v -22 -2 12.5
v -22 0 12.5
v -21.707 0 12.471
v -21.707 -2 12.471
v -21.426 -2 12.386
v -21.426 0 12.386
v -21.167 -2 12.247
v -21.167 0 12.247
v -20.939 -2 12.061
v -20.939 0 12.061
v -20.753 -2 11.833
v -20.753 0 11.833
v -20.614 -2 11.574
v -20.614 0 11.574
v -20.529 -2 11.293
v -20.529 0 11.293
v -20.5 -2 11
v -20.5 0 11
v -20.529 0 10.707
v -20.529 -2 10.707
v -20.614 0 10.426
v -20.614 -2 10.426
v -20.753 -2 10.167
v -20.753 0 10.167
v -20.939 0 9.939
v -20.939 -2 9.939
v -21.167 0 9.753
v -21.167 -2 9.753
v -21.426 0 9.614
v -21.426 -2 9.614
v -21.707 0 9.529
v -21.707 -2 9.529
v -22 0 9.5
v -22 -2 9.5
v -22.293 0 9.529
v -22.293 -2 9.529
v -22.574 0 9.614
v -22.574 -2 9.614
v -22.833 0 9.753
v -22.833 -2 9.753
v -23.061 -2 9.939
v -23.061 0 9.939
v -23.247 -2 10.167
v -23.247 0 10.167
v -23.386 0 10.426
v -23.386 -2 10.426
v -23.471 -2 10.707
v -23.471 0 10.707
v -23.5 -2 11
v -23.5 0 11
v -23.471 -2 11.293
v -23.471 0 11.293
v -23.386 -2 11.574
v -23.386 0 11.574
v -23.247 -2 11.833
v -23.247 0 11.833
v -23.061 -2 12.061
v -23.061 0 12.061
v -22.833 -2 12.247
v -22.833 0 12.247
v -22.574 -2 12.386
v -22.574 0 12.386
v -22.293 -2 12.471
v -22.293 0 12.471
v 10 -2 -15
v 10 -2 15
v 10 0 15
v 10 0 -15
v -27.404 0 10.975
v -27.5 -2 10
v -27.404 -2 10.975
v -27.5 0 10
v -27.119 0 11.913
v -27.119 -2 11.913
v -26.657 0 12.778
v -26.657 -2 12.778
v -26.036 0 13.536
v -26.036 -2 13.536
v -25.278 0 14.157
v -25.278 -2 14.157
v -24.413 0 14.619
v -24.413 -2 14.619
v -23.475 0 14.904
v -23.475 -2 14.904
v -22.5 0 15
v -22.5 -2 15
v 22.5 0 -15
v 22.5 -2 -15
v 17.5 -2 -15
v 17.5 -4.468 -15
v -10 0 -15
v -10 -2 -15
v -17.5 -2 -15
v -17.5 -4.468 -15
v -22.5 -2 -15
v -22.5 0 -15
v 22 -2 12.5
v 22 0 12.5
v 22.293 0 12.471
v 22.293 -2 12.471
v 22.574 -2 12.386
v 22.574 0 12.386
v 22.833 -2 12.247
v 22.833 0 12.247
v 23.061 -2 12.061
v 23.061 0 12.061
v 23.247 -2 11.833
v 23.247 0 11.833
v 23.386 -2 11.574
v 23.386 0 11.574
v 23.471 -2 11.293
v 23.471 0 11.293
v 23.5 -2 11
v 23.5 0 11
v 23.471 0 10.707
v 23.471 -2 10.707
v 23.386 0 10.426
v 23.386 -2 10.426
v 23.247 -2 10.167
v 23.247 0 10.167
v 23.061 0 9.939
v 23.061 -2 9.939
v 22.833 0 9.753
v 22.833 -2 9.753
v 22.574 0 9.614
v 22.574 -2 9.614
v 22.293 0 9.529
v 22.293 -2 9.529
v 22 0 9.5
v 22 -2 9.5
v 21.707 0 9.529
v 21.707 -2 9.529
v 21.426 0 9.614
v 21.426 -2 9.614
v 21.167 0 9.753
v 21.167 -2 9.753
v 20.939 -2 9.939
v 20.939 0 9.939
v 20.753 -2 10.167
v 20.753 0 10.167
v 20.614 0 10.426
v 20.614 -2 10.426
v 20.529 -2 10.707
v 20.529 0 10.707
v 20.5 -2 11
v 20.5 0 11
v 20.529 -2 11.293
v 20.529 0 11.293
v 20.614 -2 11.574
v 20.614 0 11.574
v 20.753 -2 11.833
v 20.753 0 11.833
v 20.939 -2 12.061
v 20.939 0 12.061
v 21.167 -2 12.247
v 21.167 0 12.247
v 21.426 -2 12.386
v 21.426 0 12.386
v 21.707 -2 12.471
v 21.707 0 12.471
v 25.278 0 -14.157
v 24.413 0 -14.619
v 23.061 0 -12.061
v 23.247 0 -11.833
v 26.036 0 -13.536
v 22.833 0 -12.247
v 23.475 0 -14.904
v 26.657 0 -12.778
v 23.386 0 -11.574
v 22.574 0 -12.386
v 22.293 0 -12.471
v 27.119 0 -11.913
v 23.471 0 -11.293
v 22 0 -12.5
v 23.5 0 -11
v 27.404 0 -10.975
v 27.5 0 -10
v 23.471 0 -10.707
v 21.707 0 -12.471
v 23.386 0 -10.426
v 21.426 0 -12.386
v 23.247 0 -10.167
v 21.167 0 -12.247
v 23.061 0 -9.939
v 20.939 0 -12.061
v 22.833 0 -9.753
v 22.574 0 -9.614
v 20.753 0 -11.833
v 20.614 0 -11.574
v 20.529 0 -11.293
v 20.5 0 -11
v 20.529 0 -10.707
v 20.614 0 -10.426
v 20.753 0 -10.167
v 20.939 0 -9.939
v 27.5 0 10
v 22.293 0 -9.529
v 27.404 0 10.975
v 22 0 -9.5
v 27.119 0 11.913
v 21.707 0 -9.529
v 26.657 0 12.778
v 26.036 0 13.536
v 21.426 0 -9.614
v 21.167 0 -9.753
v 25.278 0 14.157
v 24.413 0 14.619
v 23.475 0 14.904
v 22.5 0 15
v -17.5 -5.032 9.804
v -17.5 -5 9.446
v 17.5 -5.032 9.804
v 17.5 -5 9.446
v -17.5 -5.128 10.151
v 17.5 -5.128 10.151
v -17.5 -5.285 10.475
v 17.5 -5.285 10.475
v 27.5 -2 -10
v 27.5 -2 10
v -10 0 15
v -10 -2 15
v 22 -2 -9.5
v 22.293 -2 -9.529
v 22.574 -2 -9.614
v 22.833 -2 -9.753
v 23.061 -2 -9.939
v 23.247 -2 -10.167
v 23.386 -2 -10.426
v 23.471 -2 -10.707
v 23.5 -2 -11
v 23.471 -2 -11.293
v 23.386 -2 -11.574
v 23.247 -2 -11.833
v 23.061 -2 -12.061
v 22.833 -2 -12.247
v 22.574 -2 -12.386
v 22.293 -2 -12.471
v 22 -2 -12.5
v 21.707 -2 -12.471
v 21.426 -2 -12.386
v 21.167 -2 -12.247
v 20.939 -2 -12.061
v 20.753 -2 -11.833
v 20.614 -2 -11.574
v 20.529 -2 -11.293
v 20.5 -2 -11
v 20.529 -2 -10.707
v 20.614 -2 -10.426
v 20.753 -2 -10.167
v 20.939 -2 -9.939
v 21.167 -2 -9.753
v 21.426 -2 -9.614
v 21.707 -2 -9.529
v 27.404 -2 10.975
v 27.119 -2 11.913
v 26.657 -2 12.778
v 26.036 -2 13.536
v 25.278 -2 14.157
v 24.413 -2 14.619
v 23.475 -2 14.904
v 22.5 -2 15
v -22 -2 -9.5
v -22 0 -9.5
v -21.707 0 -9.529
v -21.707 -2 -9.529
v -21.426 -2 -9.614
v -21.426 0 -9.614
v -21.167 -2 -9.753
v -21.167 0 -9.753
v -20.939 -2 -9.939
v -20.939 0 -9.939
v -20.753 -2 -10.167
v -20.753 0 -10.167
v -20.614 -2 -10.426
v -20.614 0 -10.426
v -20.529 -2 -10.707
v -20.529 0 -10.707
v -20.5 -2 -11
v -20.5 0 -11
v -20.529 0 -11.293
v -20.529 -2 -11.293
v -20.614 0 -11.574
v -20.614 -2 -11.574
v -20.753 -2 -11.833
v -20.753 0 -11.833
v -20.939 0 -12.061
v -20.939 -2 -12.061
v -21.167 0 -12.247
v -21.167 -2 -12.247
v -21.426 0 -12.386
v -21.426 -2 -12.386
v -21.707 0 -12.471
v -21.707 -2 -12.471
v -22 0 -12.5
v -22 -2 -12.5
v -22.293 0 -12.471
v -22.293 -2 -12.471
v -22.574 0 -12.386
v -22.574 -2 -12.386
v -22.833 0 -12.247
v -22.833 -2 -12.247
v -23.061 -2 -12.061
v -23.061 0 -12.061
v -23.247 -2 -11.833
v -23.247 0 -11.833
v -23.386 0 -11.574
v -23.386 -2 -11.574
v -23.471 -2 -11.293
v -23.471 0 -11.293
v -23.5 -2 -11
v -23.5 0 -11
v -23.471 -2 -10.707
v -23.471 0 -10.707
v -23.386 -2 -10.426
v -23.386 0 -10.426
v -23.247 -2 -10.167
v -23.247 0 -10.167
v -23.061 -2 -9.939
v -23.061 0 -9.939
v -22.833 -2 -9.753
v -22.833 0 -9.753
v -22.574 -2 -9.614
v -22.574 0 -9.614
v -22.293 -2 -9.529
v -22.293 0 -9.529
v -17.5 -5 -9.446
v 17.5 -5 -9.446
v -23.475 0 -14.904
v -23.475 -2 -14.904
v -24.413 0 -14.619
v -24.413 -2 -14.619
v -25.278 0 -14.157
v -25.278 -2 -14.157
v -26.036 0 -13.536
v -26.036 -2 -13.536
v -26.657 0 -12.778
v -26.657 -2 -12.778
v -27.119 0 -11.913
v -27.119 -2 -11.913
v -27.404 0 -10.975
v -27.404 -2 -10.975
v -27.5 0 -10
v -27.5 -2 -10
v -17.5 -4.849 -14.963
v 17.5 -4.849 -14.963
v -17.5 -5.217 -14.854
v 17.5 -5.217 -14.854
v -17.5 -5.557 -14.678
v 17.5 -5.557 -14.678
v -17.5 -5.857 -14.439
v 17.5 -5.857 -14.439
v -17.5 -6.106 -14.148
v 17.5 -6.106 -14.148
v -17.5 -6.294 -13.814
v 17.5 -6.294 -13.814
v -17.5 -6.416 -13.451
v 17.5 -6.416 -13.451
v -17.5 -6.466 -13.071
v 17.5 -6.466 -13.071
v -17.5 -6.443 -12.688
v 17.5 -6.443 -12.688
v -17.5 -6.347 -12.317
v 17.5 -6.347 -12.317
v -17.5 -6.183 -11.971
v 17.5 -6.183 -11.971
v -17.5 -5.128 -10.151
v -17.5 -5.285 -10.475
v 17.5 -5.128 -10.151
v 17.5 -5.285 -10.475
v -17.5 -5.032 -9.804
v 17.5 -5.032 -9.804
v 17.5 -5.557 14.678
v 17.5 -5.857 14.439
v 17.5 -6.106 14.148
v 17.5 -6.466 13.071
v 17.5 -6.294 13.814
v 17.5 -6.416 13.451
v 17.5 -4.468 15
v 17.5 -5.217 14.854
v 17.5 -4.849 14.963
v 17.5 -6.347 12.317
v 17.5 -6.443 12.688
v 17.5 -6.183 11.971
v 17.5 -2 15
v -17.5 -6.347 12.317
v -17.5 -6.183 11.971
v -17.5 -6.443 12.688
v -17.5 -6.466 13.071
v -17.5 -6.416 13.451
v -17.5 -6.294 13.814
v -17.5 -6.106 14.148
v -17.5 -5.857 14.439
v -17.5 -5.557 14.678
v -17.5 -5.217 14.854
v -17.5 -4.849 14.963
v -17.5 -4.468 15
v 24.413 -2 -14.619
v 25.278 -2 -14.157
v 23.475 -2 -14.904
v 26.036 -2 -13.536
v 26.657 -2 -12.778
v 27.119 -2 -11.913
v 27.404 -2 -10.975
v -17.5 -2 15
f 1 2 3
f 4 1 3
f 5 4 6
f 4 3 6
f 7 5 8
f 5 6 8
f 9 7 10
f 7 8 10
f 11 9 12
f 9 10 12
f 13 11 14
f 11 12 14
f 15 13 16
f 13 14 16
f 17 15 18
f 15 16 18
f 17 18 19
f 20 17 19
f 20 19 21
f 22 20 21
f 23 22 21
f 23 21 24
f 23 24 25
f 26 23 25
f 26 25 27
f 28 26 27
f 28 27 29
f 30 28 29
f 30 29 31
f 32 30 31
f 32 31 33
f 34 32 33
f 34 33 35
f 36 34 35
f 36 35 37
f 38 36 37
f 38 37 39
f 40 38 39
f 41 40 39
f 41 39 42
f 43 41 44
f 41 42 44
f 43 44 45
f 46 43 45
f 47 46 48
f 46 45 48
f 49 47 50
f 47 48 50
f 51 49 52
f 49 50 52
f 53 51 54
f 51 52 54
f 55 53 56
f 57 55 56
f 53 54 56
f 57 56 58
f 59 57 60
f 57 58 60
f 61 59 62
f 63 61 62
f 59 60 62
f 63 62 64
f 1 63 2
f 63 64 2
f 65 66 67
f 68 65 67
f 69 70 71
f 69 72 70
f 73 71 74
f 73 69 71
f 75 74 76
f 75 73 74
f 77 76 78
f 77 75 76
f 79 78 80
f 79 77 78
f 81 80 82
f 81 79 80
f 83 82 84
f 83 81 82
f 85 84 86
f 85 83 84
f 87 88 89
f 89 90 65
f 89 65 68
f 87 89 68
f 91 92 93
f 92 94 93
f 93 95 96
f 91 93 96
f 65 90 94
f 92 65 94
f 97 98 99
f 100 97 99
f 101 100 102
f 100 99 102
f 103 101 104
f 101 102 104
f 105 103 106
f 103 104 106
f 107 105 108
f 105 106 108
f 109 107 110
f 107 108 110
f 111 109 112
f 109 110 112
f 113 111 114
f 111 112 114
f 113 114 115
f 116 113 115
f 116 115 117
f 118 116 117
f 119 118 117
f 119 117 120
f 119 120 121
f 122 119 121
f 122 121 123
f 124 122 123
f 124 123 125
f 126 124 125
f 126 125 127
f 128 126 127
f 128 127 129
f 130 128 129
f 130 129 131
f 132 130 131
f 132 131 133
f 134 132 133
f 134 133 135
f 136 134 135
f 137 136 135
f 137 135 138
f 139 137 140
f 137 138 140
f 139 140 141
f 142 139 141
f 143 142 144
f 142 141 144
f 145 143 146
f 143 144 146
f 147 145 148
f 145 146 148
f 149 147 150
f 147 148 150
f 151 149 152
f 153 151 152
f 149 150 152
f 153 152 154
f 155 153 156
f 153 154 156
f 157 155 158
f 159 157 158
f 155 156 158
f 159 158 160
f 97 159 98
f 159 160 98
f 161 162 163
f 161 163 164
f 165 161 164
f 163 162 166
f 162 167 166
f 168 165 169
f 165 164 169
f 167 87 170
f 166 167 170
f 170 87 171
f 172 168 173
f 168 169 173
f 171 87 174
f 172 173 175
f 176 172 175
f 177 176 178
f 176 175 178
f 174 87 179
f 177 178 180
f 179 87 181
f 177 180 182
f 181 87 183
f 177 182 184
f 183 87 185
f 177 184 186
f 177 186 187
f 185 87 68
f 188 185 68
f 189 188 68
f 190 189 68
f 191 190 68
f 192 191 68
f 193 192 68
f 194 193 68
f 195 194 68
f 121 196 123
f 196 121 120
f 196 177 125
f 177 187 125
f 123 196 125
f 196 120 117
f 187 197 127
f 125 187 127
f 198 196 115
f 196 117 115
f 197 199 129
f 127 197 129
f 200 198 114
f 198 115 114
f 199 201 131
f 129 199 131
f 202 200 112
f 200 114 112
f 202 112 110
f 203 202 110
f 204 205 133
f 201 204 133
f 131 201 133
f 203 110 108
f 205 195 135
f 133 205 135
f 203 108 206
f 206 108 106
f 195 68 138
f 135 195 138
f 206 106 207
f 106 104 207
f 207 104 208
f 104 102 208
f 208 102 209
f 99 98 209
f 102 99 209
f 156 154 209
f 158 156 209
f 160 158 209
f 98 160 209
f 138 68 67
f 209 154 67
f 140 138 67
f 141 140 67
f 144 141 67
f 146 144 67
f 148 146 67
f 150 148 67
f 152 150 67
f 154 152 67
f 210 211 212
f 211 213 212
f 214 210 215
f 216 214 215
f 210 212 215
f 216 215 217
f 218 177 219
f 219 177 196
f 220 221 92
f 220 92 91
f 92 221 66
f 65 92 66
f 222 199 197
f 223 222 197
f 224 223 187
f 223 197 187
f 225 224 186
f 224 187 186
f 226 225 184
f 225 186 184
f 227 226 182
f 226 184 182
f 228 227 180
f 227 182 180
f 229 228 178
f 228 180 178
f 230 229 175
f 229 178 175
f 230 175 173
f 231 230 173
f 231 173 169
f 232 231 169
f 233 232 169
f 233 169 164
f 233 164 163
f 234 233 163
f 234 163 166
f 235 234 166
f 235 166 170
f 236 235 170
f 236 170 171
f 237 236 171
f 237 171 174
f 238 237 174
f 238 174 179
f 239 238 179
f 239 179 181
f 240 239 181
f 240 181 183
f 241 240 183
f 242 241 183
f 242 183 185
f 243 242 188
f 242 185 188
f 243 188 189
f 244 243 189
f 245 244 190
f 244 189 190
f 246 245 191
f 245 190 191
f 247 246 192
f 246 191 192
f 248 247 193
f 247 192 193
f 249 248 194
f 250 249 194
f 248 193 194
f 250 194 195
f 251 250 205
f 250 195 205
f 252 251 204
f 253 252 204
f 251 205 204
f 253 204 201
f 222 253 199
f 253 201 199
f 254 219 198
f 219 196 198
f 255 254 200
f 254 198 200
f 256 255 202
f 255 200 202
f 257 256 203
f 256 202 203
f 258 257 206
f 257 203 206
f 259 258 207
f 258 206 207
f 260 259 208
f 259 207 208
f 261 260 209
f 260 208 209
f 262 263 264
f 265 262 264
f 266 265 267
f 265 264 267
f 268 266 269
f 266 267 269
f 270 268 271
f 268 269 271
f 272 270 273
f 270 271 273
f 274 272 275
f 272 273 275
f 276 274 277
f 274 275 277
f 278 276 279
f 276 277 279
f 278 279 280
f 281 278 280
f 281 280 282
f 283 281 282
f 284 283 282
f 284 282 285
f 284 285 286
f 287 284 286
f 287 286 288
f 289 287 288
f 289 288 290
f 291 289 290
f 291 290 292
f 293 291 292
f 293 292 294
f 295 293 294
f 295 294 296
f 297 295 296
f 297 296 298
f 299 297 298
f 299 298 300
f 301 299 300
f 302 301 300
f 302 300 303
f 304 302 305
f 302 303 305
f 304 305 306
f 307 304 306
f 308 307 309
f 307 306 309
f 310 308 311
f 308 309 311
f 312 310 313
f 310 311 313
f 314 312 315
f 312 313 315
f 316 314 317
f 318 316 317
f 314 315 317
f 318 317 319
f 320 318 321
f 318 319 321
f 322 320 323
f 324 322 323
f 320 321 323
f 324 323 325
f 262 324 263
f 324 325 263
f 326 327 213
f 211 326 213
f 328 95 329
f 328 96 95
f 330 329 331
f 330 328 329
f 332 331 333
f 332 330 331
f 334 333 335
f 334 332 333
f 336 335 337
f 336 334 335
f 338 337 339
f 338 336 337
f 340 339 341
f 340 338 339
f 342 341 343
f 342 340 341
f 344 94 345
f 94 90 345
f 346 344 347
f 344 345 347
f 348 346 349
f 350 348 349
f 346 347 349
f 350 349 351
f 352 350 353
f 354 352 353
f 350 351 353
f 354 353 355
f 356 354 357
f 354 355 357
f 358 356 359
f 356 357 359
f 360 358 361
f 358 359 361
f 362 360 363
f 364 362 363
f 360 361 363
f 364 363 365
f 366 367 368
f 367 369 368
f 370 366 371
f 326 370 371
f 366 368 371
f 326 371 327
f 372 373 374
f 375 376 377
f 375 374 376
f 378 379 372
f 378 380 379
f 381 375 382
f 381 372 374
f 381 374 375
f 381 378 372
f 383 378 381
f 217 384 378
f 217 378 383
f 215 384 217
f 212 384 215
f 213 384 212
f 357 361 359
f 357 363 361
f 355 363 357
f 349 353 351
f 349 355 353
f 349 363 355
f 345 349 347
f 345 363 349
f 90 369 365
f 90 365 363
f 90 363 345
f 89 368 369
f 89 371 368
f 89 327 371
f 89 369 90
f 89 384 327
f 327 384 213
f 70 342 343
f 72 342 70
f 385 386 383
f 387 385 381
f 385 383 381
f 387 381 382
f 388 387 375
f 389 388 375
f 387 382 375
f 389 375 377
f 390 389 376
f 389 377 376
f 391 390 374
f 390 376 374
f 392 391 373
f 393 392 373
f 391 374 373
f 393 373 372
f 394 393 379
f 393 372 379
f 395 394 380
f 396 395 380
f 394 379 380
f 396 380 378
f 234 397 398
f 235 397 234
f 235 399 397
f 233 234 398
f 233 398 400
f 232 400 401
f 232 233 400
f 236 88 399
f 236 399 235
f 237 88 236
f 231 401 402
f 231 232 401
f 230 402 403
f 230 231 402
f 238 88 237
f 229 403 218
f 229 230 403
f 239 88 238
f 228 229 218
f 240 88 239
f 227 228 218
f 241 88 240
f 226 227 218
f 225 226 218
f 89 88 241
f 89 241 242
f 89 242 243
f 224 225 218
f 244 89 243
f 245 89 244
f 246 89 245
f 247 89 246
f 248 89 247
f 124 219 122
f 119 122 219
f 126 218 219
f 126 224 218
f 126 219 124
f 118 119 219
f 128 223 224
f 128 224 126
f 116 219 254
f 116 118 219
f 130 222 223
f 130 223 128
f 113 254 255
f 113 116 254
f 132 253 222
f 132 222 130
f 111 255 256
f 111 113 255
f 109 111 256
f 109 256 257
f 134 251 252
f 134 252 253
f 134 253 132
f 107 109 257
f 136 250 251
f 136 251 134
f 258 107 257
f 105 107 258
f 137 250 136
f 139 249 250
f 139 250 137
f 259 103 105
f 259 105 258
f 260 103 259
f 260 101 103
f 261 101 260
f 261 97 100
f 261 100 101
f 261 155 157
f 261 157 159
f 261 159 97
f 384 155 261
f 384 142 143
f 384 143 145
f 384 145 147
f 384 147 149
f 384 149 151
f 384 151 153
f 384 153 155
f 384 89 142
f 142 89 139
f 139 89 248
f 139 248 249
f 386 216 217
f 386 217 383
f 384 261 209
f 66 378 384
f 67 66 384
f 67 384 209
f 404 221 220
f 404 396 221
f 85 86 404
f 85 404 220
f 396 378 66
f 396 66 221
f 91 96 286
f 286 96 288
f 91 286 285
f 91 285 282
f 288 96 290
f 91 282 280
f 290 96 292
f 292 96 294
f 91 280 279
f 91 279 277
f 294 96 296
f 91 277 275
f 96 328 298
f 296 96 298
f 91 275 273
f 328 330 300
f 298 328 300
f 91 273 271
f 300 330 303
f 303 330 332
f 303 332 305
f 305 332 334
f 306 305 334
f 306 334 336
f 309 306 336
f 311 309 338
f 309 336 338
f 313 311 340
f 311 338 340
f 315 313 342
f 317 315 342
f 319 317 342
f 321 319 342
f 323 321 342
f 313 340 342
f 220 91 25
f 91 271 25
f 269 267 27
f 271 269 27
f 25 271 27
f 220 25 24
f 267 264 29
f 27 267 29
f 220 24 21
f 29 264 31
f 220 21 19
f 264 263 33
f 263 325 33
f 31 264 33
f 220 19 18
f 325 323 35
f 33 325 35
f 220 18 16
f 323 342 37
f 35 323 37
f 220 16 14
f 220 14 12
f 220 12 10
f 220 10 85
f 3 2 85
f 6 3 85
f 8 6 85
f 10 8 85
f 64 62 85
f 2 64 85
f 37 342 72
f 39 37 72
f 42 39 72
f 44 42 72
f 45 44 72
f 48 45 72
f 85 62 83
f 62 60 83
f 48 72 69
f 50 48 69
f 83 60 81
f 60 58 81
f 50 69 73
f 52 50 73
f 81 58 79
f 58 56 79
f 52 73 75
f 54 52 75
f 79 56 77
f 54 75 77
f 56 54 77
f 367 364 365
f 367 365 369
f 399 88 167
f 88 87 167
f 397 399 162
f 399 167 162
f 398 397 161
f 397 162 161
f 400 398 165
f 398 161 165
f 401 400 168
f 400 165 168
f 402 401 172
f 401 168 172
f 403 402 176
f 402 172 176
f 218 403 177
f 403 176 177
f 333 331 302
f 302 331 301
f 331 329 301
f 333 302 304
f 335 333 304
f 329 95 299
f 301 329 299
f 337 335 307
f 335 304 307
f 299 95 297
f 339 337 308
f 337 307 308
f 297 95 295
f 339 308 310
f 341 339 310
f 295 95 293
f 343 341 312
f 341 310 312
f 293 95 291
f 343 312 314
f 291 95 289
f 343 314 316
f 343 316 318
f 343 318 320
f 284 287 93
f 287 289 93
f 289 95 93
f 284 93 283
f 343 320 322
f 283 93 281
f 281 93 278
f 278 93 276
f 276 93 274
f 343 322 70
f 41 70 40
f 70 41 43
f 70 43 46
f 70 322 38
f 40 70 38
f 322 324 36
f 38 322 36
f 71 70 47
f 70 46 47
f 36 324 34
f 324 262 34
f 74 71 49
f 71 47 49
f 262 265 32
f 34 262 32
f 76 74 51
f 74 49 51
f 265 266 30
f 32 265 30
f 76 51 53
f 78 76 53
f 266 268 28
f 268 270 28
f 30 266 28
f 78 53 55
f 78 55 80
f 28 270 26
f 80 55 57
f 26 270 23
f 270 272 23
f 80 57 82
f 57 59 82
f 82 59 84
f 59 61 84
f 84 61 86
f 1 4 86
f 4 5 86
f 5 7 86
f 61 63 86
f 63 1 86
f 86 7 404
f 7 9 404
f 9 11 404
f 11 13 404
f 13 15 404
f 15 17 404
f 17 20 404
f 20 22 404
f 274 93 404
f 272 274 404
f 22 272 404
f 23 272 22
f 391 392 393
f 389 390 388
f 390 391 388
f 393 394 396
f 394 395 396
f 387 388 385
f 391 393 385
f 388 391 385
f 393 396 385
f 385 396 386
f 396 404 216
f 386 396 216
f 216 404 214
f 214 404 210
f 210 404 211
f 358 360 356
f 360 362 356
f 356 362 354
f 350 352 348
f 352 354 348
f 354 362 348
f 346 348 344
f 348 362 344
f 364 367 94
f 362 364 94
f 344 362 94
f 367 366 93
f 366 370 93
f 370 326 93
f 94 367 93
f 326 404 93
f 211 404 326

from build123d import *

# Parameters (mm, degrees)
SKETCH1_W               = 35
SKETCH1_H               = 30
BOSS_EXTRUDE1_DEPTH     = 8
CUT_EXTRUDE1_DEPTH      = 39.910152917
CUT_EXTRUDE1_DEPTH_BACK = 39.910152917
FILLET1_R               = 2
SKETCH5_W               = 30
SKETCH5_H               = 2
BOSS_EXTRUDE2_DEPTH     = 10
SKETCH6_R               = 1.5
CUT_EXTRUDE2_DEPTH      = 10
SKETCH3_W               = 10
SKETCH3_H               = 2
CUT_EXTRUDE3_DEPTH      = 42.207767455
FILLET3_R               = 5


with BuildPart() as part:
    # Sketch1 → Boss-Extrude1 (new body)
    with BuildSketch(Plane(origin=(0, 0, 0), x_dir=(1, 0, 0), z_dir=(0, 1, 0))):
        Rectangle(SKETCH1_W, SKETCH1_H)
    extrude(amount=-BOSS_EXTRUDE1_DEPTH)

    # Sketch2 → Cut-Extrude1 (cut, two sides: drawn at the far end of the back side and taken through both)
    with BuildSketch(Plane(origin=(17.5, 0, 0), x_dir=(0, 0, -1), z_dir=(1, 0, 0)).offset(-CUT_EXTRUDE1_DEPTH_BACK)):
        Polygon((-10, -5), (-15, -8), (0, -8), (0, -5), align=None)
        Polygon((0, -5), (0, -8), (15, -8), (10, -5), align=None)
    extrude(amount=CUT_EXTRUDE1_DEPTH + CUT_EXTRUDE1_DEPTH_BACK, mode=Mode.SUBTRACT)

    # Fillet1
    fillet1_edges = [part.edges().sort_by_distance(p)[0] for p in [
        (0, -8, -15),
        (0, -5, 10),
        (0, -5, -10),
        (0, -8, 15),
    ]]
    fillet(fillet1_edges, radius=FILLET1_R)

    # Sketch5 → Boss-Extrude2 (add)
    with BuildSketch(Plane.ZY.offset(17.5)):
        with Locations((0, -1)):
            Rectangle(SKETCH5_W, SKETCH5_H)
    boss_extrude2 = extrude(amount=BOSS_EXTRUDE2_DEPTH)

    # Mirror1: Boss-Extrude2 across plane
    add(boss_extrude2.mirror(Plane(origin=(0, 0, 0), x_dir=(0, 0, 1), z_dir=(1, 0, 0))))

    # Sketch6 → Cut-Extrude2 (cut)
    with BuildSketch(Plane(origin=(0, 0, 0), x_dir=(1, 0, 0), z_dir=(0, 1, 0))):
        with Locations(Location((-22, 11, 0), (0, 0, 270))):
            Circle(SKETCH6_R)
        with Locations(Location((-22, -11, 0), (0, 0, 270))):
            Circle(SKETCH6_R)
        with Locations(Location((22, -11, 0), (0, 0, 270))):
            Circle(SKETCH6_R)
        with Locations(Location((22, 11, 0), (0, 0, 270))):
            Circle(SKETCH6_R)
    extrude(amount=-CUT_EXTRUDE2_DEPTH, mode=Mode.SUBTRACT)

    # Sketch3 → Cut-Extrude3 (cut, through all)
    with BuildSketch(Plane.XY.offset(15)):
        with Locations((5, -1)):
            Rectangle(SKETCH3_W, SKETCH3_H)
        with Locations((-5, -1)):
            Rectangle(SKETCH3_W, SKETCH3_H)
    extrude(amount=-CUT_EXTRUDE3_DEPTH, mode=Mode.SUBTRACT)

    # Fillet3
    fillet3_edges = [part.edges().sort_by_distance(p)[0] for p in [
        (-27.5, -1, -15),
        (-27.5, -1, 15),
        (27.5, -1, -15),
        (27.5, -1, 15),
    ]]
    fillet(fillet3_edges, radius=FILLET3_R)


solid = part.part
